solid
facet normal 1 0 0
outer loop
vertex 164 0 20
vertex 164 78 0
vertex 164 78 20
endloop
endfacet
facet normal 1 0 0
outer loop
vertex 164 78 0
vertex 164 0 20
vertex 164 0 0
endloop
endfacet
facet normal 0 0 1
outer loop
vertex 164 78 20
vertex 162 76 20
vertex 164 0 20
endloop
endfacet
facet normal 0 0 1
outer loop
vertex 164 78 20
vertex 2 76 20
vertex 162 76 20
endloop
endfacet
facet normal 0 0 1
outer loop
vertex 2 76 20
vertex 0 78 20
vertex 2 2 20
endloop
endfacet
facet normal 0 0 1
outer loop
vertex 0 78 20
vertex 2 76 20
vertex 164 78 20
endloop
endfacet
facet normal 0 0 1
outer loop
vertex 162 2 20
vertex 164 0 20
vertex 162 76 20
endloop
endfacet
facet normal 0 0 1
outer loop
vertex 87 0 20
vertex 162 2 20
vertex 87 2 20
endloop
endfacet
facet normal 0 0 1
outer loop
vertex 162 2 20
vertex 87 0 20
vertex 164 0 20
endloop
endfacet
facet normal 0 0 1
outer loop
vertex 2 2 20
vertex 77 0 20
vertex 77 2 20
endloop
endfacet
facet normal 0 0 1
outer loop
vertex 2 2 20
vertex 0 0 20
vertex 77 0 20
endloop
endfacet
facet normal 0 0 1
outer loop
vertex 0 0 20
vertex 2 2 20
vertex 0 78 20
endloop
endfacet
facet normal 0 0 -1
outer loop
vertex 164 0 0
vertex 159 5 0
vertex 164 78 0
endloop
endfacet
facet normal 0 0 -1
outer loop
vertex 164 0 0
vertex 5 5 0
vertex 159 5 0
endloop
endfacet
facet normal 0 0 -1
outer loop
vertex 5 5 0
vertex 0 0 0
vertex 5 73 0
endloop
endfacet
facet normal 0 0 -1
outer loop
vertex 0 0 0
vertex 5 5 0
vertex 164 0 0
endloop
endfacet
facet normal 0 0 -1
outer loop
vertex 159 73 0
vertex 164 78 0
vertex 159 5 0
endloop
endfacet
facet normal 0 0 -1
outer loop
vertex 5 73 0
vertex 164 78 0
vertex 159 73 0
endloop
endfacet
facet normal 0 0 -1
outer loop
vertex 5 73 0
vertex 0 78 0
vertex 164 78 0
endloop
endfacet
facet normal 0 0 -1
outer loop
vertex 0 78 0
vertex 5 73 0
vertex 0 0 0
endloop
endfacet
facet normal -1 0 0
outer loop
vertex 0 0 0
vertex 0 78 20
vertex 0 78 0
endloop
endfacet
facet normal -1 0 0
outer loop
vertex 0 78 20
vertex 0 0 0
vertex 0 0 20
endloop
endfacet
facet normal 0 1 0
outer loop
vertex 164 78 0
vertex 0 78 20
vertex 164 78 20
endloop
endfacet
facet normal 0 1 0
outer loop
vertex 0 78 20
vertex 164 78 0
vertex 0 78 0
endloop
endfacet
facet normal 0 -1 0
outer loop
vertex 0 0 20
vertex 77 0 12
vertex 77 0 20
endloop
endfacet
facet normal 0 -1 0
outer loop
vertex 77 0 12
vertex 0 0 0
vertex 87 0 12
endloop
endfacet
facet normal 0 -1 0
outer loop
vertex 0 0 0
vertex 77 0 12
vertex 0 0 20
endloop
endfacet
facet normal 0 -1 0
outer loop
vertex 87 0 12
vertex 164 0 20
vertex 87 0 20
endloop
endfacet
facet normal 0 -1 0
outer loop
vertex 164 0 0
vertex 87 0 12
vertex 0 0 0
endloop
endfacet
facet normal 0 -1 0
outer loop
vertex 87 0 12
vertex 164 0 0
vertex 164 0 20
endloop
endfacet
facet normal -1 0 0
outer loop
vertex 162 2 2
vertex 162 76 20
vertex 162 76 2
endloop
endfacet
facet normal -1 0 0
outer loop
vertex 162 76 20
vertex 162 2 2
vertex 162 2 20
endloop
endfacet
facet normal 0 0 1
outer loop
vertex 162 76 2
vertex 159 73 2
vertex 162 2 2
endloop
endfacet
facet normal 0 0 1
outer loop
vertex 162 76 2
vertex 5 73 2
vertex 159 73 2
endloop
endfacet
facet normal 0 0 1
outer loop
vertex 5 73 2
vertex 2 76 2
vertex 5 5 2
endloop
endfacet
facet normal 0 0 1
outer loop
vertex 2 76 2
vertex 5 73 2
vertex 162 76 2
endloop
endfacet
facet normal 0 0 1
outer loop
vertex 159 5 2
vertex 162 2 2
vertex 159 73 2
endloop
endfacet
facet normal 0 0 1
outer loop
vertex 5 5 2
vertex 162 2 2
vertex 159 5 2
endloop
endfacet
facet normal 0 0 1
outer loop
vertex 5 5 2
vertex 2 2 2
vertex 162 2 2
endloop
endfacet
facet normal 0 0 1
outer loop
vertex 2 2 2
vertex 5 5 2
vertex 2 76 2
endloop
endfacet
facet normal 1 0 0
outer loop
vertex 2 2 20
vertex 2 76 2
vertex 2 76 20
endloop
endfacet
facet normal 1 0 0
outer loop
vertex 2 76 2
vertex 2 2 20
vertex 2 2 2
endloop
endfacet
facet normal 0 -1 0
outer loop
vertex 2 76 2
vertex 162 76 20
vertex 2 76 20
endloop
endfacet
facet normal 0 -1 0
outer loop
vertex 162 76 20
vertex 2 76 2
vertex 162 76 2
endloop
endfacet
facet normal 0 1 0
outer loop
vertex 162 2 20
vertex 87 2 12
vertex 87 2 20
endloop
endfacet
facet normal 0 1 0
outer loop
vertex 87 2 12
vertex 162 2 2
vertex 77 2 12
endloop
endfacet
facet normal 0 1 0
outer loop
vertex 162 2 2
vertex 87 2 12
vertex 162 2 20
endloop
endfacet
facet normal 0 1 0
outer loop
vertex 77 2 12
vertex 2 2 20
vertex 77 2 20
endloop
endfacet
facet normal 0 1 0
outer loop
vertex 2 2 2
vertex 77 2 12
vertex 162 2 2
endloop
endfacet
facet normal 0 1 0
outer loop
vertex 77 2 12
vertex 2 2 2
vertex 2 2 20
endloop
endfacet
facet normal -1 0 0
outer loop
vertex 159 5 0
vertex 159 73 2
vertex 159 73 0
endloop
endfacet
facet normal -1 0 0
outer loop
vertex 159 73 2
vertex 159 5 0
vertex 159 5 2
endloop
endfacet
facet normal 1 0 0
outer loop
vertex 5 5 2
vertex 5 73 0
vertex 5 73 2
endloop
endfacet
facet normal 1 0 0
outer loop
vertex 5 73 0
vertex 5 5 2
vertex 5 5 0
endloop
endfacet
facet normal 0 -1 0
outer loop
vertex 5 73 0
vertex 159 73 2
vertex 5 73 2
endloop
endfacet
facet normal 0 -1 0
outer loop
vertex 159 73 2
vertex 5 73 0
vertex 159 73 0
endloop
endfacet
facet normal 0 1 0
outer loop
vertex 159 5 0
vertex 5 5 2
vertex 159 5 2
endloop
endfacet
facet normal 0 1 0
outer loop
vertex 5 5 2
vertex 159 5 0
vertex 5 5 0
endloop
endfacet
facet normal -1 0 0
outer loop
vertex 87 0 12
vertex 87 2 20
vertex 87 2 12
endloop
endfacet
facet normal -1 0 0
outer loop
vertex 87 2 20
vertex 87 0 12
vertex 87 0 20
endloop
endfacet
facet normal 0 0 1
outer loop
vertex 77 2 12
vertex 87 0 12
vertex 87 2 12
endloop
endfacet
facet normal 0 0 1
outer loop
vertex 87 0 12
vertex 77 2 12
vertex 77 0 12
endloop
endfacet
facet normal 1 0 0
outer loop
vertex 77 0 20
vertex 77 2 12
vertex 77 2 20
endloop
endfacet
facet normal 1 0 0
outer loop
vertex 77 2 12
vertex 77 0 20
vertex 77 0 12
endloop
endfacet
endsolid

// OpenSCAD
// Box enclosure for 160x74x18mm object

// Inner dimensions (the object to enclose)
inner_length = 160;
inner_width = 74;
inner_height = 18;

// Wall thickness
wall = 2;

// Bottom hole inset from inner walls
hole_inset = 3;

// Side hole dimensions
side_hole_width = 10;
side_hole_height = 8;

// Outer dimensions
outer_length = inner_length + 2 * wall;
outer_width = inner_width + 2 * wall;
outer_height = inner_height + wall; // wall on bottom only, open top

// Bottom hole dimensions
hole_length = inner_length - 2 * hole_inset;
hole_width = inner_width - 2 * hole_inset;

difference() {
    // Outer shell
    cube([outer_length, outer_width, outer_height]);

    // Inner cavity
    translate([wall, wall, wall])
        cube([inner_length, inner_width, inner_height + 1]);

    // Square hole in the bottom
    translate([wall + hole_inset, wall + hole_inset, -1])
        cube([hole_length, hole_width, wall + 2]);

    // Hole on the long side (front), centered horizontally, near top edge
    translate([outer_length / 2 - side_hole_width / 2, -1, outer_height - side_hole_height])
        cube([side_hole_width, wall + 2, side_hole_height + 1]);
}
